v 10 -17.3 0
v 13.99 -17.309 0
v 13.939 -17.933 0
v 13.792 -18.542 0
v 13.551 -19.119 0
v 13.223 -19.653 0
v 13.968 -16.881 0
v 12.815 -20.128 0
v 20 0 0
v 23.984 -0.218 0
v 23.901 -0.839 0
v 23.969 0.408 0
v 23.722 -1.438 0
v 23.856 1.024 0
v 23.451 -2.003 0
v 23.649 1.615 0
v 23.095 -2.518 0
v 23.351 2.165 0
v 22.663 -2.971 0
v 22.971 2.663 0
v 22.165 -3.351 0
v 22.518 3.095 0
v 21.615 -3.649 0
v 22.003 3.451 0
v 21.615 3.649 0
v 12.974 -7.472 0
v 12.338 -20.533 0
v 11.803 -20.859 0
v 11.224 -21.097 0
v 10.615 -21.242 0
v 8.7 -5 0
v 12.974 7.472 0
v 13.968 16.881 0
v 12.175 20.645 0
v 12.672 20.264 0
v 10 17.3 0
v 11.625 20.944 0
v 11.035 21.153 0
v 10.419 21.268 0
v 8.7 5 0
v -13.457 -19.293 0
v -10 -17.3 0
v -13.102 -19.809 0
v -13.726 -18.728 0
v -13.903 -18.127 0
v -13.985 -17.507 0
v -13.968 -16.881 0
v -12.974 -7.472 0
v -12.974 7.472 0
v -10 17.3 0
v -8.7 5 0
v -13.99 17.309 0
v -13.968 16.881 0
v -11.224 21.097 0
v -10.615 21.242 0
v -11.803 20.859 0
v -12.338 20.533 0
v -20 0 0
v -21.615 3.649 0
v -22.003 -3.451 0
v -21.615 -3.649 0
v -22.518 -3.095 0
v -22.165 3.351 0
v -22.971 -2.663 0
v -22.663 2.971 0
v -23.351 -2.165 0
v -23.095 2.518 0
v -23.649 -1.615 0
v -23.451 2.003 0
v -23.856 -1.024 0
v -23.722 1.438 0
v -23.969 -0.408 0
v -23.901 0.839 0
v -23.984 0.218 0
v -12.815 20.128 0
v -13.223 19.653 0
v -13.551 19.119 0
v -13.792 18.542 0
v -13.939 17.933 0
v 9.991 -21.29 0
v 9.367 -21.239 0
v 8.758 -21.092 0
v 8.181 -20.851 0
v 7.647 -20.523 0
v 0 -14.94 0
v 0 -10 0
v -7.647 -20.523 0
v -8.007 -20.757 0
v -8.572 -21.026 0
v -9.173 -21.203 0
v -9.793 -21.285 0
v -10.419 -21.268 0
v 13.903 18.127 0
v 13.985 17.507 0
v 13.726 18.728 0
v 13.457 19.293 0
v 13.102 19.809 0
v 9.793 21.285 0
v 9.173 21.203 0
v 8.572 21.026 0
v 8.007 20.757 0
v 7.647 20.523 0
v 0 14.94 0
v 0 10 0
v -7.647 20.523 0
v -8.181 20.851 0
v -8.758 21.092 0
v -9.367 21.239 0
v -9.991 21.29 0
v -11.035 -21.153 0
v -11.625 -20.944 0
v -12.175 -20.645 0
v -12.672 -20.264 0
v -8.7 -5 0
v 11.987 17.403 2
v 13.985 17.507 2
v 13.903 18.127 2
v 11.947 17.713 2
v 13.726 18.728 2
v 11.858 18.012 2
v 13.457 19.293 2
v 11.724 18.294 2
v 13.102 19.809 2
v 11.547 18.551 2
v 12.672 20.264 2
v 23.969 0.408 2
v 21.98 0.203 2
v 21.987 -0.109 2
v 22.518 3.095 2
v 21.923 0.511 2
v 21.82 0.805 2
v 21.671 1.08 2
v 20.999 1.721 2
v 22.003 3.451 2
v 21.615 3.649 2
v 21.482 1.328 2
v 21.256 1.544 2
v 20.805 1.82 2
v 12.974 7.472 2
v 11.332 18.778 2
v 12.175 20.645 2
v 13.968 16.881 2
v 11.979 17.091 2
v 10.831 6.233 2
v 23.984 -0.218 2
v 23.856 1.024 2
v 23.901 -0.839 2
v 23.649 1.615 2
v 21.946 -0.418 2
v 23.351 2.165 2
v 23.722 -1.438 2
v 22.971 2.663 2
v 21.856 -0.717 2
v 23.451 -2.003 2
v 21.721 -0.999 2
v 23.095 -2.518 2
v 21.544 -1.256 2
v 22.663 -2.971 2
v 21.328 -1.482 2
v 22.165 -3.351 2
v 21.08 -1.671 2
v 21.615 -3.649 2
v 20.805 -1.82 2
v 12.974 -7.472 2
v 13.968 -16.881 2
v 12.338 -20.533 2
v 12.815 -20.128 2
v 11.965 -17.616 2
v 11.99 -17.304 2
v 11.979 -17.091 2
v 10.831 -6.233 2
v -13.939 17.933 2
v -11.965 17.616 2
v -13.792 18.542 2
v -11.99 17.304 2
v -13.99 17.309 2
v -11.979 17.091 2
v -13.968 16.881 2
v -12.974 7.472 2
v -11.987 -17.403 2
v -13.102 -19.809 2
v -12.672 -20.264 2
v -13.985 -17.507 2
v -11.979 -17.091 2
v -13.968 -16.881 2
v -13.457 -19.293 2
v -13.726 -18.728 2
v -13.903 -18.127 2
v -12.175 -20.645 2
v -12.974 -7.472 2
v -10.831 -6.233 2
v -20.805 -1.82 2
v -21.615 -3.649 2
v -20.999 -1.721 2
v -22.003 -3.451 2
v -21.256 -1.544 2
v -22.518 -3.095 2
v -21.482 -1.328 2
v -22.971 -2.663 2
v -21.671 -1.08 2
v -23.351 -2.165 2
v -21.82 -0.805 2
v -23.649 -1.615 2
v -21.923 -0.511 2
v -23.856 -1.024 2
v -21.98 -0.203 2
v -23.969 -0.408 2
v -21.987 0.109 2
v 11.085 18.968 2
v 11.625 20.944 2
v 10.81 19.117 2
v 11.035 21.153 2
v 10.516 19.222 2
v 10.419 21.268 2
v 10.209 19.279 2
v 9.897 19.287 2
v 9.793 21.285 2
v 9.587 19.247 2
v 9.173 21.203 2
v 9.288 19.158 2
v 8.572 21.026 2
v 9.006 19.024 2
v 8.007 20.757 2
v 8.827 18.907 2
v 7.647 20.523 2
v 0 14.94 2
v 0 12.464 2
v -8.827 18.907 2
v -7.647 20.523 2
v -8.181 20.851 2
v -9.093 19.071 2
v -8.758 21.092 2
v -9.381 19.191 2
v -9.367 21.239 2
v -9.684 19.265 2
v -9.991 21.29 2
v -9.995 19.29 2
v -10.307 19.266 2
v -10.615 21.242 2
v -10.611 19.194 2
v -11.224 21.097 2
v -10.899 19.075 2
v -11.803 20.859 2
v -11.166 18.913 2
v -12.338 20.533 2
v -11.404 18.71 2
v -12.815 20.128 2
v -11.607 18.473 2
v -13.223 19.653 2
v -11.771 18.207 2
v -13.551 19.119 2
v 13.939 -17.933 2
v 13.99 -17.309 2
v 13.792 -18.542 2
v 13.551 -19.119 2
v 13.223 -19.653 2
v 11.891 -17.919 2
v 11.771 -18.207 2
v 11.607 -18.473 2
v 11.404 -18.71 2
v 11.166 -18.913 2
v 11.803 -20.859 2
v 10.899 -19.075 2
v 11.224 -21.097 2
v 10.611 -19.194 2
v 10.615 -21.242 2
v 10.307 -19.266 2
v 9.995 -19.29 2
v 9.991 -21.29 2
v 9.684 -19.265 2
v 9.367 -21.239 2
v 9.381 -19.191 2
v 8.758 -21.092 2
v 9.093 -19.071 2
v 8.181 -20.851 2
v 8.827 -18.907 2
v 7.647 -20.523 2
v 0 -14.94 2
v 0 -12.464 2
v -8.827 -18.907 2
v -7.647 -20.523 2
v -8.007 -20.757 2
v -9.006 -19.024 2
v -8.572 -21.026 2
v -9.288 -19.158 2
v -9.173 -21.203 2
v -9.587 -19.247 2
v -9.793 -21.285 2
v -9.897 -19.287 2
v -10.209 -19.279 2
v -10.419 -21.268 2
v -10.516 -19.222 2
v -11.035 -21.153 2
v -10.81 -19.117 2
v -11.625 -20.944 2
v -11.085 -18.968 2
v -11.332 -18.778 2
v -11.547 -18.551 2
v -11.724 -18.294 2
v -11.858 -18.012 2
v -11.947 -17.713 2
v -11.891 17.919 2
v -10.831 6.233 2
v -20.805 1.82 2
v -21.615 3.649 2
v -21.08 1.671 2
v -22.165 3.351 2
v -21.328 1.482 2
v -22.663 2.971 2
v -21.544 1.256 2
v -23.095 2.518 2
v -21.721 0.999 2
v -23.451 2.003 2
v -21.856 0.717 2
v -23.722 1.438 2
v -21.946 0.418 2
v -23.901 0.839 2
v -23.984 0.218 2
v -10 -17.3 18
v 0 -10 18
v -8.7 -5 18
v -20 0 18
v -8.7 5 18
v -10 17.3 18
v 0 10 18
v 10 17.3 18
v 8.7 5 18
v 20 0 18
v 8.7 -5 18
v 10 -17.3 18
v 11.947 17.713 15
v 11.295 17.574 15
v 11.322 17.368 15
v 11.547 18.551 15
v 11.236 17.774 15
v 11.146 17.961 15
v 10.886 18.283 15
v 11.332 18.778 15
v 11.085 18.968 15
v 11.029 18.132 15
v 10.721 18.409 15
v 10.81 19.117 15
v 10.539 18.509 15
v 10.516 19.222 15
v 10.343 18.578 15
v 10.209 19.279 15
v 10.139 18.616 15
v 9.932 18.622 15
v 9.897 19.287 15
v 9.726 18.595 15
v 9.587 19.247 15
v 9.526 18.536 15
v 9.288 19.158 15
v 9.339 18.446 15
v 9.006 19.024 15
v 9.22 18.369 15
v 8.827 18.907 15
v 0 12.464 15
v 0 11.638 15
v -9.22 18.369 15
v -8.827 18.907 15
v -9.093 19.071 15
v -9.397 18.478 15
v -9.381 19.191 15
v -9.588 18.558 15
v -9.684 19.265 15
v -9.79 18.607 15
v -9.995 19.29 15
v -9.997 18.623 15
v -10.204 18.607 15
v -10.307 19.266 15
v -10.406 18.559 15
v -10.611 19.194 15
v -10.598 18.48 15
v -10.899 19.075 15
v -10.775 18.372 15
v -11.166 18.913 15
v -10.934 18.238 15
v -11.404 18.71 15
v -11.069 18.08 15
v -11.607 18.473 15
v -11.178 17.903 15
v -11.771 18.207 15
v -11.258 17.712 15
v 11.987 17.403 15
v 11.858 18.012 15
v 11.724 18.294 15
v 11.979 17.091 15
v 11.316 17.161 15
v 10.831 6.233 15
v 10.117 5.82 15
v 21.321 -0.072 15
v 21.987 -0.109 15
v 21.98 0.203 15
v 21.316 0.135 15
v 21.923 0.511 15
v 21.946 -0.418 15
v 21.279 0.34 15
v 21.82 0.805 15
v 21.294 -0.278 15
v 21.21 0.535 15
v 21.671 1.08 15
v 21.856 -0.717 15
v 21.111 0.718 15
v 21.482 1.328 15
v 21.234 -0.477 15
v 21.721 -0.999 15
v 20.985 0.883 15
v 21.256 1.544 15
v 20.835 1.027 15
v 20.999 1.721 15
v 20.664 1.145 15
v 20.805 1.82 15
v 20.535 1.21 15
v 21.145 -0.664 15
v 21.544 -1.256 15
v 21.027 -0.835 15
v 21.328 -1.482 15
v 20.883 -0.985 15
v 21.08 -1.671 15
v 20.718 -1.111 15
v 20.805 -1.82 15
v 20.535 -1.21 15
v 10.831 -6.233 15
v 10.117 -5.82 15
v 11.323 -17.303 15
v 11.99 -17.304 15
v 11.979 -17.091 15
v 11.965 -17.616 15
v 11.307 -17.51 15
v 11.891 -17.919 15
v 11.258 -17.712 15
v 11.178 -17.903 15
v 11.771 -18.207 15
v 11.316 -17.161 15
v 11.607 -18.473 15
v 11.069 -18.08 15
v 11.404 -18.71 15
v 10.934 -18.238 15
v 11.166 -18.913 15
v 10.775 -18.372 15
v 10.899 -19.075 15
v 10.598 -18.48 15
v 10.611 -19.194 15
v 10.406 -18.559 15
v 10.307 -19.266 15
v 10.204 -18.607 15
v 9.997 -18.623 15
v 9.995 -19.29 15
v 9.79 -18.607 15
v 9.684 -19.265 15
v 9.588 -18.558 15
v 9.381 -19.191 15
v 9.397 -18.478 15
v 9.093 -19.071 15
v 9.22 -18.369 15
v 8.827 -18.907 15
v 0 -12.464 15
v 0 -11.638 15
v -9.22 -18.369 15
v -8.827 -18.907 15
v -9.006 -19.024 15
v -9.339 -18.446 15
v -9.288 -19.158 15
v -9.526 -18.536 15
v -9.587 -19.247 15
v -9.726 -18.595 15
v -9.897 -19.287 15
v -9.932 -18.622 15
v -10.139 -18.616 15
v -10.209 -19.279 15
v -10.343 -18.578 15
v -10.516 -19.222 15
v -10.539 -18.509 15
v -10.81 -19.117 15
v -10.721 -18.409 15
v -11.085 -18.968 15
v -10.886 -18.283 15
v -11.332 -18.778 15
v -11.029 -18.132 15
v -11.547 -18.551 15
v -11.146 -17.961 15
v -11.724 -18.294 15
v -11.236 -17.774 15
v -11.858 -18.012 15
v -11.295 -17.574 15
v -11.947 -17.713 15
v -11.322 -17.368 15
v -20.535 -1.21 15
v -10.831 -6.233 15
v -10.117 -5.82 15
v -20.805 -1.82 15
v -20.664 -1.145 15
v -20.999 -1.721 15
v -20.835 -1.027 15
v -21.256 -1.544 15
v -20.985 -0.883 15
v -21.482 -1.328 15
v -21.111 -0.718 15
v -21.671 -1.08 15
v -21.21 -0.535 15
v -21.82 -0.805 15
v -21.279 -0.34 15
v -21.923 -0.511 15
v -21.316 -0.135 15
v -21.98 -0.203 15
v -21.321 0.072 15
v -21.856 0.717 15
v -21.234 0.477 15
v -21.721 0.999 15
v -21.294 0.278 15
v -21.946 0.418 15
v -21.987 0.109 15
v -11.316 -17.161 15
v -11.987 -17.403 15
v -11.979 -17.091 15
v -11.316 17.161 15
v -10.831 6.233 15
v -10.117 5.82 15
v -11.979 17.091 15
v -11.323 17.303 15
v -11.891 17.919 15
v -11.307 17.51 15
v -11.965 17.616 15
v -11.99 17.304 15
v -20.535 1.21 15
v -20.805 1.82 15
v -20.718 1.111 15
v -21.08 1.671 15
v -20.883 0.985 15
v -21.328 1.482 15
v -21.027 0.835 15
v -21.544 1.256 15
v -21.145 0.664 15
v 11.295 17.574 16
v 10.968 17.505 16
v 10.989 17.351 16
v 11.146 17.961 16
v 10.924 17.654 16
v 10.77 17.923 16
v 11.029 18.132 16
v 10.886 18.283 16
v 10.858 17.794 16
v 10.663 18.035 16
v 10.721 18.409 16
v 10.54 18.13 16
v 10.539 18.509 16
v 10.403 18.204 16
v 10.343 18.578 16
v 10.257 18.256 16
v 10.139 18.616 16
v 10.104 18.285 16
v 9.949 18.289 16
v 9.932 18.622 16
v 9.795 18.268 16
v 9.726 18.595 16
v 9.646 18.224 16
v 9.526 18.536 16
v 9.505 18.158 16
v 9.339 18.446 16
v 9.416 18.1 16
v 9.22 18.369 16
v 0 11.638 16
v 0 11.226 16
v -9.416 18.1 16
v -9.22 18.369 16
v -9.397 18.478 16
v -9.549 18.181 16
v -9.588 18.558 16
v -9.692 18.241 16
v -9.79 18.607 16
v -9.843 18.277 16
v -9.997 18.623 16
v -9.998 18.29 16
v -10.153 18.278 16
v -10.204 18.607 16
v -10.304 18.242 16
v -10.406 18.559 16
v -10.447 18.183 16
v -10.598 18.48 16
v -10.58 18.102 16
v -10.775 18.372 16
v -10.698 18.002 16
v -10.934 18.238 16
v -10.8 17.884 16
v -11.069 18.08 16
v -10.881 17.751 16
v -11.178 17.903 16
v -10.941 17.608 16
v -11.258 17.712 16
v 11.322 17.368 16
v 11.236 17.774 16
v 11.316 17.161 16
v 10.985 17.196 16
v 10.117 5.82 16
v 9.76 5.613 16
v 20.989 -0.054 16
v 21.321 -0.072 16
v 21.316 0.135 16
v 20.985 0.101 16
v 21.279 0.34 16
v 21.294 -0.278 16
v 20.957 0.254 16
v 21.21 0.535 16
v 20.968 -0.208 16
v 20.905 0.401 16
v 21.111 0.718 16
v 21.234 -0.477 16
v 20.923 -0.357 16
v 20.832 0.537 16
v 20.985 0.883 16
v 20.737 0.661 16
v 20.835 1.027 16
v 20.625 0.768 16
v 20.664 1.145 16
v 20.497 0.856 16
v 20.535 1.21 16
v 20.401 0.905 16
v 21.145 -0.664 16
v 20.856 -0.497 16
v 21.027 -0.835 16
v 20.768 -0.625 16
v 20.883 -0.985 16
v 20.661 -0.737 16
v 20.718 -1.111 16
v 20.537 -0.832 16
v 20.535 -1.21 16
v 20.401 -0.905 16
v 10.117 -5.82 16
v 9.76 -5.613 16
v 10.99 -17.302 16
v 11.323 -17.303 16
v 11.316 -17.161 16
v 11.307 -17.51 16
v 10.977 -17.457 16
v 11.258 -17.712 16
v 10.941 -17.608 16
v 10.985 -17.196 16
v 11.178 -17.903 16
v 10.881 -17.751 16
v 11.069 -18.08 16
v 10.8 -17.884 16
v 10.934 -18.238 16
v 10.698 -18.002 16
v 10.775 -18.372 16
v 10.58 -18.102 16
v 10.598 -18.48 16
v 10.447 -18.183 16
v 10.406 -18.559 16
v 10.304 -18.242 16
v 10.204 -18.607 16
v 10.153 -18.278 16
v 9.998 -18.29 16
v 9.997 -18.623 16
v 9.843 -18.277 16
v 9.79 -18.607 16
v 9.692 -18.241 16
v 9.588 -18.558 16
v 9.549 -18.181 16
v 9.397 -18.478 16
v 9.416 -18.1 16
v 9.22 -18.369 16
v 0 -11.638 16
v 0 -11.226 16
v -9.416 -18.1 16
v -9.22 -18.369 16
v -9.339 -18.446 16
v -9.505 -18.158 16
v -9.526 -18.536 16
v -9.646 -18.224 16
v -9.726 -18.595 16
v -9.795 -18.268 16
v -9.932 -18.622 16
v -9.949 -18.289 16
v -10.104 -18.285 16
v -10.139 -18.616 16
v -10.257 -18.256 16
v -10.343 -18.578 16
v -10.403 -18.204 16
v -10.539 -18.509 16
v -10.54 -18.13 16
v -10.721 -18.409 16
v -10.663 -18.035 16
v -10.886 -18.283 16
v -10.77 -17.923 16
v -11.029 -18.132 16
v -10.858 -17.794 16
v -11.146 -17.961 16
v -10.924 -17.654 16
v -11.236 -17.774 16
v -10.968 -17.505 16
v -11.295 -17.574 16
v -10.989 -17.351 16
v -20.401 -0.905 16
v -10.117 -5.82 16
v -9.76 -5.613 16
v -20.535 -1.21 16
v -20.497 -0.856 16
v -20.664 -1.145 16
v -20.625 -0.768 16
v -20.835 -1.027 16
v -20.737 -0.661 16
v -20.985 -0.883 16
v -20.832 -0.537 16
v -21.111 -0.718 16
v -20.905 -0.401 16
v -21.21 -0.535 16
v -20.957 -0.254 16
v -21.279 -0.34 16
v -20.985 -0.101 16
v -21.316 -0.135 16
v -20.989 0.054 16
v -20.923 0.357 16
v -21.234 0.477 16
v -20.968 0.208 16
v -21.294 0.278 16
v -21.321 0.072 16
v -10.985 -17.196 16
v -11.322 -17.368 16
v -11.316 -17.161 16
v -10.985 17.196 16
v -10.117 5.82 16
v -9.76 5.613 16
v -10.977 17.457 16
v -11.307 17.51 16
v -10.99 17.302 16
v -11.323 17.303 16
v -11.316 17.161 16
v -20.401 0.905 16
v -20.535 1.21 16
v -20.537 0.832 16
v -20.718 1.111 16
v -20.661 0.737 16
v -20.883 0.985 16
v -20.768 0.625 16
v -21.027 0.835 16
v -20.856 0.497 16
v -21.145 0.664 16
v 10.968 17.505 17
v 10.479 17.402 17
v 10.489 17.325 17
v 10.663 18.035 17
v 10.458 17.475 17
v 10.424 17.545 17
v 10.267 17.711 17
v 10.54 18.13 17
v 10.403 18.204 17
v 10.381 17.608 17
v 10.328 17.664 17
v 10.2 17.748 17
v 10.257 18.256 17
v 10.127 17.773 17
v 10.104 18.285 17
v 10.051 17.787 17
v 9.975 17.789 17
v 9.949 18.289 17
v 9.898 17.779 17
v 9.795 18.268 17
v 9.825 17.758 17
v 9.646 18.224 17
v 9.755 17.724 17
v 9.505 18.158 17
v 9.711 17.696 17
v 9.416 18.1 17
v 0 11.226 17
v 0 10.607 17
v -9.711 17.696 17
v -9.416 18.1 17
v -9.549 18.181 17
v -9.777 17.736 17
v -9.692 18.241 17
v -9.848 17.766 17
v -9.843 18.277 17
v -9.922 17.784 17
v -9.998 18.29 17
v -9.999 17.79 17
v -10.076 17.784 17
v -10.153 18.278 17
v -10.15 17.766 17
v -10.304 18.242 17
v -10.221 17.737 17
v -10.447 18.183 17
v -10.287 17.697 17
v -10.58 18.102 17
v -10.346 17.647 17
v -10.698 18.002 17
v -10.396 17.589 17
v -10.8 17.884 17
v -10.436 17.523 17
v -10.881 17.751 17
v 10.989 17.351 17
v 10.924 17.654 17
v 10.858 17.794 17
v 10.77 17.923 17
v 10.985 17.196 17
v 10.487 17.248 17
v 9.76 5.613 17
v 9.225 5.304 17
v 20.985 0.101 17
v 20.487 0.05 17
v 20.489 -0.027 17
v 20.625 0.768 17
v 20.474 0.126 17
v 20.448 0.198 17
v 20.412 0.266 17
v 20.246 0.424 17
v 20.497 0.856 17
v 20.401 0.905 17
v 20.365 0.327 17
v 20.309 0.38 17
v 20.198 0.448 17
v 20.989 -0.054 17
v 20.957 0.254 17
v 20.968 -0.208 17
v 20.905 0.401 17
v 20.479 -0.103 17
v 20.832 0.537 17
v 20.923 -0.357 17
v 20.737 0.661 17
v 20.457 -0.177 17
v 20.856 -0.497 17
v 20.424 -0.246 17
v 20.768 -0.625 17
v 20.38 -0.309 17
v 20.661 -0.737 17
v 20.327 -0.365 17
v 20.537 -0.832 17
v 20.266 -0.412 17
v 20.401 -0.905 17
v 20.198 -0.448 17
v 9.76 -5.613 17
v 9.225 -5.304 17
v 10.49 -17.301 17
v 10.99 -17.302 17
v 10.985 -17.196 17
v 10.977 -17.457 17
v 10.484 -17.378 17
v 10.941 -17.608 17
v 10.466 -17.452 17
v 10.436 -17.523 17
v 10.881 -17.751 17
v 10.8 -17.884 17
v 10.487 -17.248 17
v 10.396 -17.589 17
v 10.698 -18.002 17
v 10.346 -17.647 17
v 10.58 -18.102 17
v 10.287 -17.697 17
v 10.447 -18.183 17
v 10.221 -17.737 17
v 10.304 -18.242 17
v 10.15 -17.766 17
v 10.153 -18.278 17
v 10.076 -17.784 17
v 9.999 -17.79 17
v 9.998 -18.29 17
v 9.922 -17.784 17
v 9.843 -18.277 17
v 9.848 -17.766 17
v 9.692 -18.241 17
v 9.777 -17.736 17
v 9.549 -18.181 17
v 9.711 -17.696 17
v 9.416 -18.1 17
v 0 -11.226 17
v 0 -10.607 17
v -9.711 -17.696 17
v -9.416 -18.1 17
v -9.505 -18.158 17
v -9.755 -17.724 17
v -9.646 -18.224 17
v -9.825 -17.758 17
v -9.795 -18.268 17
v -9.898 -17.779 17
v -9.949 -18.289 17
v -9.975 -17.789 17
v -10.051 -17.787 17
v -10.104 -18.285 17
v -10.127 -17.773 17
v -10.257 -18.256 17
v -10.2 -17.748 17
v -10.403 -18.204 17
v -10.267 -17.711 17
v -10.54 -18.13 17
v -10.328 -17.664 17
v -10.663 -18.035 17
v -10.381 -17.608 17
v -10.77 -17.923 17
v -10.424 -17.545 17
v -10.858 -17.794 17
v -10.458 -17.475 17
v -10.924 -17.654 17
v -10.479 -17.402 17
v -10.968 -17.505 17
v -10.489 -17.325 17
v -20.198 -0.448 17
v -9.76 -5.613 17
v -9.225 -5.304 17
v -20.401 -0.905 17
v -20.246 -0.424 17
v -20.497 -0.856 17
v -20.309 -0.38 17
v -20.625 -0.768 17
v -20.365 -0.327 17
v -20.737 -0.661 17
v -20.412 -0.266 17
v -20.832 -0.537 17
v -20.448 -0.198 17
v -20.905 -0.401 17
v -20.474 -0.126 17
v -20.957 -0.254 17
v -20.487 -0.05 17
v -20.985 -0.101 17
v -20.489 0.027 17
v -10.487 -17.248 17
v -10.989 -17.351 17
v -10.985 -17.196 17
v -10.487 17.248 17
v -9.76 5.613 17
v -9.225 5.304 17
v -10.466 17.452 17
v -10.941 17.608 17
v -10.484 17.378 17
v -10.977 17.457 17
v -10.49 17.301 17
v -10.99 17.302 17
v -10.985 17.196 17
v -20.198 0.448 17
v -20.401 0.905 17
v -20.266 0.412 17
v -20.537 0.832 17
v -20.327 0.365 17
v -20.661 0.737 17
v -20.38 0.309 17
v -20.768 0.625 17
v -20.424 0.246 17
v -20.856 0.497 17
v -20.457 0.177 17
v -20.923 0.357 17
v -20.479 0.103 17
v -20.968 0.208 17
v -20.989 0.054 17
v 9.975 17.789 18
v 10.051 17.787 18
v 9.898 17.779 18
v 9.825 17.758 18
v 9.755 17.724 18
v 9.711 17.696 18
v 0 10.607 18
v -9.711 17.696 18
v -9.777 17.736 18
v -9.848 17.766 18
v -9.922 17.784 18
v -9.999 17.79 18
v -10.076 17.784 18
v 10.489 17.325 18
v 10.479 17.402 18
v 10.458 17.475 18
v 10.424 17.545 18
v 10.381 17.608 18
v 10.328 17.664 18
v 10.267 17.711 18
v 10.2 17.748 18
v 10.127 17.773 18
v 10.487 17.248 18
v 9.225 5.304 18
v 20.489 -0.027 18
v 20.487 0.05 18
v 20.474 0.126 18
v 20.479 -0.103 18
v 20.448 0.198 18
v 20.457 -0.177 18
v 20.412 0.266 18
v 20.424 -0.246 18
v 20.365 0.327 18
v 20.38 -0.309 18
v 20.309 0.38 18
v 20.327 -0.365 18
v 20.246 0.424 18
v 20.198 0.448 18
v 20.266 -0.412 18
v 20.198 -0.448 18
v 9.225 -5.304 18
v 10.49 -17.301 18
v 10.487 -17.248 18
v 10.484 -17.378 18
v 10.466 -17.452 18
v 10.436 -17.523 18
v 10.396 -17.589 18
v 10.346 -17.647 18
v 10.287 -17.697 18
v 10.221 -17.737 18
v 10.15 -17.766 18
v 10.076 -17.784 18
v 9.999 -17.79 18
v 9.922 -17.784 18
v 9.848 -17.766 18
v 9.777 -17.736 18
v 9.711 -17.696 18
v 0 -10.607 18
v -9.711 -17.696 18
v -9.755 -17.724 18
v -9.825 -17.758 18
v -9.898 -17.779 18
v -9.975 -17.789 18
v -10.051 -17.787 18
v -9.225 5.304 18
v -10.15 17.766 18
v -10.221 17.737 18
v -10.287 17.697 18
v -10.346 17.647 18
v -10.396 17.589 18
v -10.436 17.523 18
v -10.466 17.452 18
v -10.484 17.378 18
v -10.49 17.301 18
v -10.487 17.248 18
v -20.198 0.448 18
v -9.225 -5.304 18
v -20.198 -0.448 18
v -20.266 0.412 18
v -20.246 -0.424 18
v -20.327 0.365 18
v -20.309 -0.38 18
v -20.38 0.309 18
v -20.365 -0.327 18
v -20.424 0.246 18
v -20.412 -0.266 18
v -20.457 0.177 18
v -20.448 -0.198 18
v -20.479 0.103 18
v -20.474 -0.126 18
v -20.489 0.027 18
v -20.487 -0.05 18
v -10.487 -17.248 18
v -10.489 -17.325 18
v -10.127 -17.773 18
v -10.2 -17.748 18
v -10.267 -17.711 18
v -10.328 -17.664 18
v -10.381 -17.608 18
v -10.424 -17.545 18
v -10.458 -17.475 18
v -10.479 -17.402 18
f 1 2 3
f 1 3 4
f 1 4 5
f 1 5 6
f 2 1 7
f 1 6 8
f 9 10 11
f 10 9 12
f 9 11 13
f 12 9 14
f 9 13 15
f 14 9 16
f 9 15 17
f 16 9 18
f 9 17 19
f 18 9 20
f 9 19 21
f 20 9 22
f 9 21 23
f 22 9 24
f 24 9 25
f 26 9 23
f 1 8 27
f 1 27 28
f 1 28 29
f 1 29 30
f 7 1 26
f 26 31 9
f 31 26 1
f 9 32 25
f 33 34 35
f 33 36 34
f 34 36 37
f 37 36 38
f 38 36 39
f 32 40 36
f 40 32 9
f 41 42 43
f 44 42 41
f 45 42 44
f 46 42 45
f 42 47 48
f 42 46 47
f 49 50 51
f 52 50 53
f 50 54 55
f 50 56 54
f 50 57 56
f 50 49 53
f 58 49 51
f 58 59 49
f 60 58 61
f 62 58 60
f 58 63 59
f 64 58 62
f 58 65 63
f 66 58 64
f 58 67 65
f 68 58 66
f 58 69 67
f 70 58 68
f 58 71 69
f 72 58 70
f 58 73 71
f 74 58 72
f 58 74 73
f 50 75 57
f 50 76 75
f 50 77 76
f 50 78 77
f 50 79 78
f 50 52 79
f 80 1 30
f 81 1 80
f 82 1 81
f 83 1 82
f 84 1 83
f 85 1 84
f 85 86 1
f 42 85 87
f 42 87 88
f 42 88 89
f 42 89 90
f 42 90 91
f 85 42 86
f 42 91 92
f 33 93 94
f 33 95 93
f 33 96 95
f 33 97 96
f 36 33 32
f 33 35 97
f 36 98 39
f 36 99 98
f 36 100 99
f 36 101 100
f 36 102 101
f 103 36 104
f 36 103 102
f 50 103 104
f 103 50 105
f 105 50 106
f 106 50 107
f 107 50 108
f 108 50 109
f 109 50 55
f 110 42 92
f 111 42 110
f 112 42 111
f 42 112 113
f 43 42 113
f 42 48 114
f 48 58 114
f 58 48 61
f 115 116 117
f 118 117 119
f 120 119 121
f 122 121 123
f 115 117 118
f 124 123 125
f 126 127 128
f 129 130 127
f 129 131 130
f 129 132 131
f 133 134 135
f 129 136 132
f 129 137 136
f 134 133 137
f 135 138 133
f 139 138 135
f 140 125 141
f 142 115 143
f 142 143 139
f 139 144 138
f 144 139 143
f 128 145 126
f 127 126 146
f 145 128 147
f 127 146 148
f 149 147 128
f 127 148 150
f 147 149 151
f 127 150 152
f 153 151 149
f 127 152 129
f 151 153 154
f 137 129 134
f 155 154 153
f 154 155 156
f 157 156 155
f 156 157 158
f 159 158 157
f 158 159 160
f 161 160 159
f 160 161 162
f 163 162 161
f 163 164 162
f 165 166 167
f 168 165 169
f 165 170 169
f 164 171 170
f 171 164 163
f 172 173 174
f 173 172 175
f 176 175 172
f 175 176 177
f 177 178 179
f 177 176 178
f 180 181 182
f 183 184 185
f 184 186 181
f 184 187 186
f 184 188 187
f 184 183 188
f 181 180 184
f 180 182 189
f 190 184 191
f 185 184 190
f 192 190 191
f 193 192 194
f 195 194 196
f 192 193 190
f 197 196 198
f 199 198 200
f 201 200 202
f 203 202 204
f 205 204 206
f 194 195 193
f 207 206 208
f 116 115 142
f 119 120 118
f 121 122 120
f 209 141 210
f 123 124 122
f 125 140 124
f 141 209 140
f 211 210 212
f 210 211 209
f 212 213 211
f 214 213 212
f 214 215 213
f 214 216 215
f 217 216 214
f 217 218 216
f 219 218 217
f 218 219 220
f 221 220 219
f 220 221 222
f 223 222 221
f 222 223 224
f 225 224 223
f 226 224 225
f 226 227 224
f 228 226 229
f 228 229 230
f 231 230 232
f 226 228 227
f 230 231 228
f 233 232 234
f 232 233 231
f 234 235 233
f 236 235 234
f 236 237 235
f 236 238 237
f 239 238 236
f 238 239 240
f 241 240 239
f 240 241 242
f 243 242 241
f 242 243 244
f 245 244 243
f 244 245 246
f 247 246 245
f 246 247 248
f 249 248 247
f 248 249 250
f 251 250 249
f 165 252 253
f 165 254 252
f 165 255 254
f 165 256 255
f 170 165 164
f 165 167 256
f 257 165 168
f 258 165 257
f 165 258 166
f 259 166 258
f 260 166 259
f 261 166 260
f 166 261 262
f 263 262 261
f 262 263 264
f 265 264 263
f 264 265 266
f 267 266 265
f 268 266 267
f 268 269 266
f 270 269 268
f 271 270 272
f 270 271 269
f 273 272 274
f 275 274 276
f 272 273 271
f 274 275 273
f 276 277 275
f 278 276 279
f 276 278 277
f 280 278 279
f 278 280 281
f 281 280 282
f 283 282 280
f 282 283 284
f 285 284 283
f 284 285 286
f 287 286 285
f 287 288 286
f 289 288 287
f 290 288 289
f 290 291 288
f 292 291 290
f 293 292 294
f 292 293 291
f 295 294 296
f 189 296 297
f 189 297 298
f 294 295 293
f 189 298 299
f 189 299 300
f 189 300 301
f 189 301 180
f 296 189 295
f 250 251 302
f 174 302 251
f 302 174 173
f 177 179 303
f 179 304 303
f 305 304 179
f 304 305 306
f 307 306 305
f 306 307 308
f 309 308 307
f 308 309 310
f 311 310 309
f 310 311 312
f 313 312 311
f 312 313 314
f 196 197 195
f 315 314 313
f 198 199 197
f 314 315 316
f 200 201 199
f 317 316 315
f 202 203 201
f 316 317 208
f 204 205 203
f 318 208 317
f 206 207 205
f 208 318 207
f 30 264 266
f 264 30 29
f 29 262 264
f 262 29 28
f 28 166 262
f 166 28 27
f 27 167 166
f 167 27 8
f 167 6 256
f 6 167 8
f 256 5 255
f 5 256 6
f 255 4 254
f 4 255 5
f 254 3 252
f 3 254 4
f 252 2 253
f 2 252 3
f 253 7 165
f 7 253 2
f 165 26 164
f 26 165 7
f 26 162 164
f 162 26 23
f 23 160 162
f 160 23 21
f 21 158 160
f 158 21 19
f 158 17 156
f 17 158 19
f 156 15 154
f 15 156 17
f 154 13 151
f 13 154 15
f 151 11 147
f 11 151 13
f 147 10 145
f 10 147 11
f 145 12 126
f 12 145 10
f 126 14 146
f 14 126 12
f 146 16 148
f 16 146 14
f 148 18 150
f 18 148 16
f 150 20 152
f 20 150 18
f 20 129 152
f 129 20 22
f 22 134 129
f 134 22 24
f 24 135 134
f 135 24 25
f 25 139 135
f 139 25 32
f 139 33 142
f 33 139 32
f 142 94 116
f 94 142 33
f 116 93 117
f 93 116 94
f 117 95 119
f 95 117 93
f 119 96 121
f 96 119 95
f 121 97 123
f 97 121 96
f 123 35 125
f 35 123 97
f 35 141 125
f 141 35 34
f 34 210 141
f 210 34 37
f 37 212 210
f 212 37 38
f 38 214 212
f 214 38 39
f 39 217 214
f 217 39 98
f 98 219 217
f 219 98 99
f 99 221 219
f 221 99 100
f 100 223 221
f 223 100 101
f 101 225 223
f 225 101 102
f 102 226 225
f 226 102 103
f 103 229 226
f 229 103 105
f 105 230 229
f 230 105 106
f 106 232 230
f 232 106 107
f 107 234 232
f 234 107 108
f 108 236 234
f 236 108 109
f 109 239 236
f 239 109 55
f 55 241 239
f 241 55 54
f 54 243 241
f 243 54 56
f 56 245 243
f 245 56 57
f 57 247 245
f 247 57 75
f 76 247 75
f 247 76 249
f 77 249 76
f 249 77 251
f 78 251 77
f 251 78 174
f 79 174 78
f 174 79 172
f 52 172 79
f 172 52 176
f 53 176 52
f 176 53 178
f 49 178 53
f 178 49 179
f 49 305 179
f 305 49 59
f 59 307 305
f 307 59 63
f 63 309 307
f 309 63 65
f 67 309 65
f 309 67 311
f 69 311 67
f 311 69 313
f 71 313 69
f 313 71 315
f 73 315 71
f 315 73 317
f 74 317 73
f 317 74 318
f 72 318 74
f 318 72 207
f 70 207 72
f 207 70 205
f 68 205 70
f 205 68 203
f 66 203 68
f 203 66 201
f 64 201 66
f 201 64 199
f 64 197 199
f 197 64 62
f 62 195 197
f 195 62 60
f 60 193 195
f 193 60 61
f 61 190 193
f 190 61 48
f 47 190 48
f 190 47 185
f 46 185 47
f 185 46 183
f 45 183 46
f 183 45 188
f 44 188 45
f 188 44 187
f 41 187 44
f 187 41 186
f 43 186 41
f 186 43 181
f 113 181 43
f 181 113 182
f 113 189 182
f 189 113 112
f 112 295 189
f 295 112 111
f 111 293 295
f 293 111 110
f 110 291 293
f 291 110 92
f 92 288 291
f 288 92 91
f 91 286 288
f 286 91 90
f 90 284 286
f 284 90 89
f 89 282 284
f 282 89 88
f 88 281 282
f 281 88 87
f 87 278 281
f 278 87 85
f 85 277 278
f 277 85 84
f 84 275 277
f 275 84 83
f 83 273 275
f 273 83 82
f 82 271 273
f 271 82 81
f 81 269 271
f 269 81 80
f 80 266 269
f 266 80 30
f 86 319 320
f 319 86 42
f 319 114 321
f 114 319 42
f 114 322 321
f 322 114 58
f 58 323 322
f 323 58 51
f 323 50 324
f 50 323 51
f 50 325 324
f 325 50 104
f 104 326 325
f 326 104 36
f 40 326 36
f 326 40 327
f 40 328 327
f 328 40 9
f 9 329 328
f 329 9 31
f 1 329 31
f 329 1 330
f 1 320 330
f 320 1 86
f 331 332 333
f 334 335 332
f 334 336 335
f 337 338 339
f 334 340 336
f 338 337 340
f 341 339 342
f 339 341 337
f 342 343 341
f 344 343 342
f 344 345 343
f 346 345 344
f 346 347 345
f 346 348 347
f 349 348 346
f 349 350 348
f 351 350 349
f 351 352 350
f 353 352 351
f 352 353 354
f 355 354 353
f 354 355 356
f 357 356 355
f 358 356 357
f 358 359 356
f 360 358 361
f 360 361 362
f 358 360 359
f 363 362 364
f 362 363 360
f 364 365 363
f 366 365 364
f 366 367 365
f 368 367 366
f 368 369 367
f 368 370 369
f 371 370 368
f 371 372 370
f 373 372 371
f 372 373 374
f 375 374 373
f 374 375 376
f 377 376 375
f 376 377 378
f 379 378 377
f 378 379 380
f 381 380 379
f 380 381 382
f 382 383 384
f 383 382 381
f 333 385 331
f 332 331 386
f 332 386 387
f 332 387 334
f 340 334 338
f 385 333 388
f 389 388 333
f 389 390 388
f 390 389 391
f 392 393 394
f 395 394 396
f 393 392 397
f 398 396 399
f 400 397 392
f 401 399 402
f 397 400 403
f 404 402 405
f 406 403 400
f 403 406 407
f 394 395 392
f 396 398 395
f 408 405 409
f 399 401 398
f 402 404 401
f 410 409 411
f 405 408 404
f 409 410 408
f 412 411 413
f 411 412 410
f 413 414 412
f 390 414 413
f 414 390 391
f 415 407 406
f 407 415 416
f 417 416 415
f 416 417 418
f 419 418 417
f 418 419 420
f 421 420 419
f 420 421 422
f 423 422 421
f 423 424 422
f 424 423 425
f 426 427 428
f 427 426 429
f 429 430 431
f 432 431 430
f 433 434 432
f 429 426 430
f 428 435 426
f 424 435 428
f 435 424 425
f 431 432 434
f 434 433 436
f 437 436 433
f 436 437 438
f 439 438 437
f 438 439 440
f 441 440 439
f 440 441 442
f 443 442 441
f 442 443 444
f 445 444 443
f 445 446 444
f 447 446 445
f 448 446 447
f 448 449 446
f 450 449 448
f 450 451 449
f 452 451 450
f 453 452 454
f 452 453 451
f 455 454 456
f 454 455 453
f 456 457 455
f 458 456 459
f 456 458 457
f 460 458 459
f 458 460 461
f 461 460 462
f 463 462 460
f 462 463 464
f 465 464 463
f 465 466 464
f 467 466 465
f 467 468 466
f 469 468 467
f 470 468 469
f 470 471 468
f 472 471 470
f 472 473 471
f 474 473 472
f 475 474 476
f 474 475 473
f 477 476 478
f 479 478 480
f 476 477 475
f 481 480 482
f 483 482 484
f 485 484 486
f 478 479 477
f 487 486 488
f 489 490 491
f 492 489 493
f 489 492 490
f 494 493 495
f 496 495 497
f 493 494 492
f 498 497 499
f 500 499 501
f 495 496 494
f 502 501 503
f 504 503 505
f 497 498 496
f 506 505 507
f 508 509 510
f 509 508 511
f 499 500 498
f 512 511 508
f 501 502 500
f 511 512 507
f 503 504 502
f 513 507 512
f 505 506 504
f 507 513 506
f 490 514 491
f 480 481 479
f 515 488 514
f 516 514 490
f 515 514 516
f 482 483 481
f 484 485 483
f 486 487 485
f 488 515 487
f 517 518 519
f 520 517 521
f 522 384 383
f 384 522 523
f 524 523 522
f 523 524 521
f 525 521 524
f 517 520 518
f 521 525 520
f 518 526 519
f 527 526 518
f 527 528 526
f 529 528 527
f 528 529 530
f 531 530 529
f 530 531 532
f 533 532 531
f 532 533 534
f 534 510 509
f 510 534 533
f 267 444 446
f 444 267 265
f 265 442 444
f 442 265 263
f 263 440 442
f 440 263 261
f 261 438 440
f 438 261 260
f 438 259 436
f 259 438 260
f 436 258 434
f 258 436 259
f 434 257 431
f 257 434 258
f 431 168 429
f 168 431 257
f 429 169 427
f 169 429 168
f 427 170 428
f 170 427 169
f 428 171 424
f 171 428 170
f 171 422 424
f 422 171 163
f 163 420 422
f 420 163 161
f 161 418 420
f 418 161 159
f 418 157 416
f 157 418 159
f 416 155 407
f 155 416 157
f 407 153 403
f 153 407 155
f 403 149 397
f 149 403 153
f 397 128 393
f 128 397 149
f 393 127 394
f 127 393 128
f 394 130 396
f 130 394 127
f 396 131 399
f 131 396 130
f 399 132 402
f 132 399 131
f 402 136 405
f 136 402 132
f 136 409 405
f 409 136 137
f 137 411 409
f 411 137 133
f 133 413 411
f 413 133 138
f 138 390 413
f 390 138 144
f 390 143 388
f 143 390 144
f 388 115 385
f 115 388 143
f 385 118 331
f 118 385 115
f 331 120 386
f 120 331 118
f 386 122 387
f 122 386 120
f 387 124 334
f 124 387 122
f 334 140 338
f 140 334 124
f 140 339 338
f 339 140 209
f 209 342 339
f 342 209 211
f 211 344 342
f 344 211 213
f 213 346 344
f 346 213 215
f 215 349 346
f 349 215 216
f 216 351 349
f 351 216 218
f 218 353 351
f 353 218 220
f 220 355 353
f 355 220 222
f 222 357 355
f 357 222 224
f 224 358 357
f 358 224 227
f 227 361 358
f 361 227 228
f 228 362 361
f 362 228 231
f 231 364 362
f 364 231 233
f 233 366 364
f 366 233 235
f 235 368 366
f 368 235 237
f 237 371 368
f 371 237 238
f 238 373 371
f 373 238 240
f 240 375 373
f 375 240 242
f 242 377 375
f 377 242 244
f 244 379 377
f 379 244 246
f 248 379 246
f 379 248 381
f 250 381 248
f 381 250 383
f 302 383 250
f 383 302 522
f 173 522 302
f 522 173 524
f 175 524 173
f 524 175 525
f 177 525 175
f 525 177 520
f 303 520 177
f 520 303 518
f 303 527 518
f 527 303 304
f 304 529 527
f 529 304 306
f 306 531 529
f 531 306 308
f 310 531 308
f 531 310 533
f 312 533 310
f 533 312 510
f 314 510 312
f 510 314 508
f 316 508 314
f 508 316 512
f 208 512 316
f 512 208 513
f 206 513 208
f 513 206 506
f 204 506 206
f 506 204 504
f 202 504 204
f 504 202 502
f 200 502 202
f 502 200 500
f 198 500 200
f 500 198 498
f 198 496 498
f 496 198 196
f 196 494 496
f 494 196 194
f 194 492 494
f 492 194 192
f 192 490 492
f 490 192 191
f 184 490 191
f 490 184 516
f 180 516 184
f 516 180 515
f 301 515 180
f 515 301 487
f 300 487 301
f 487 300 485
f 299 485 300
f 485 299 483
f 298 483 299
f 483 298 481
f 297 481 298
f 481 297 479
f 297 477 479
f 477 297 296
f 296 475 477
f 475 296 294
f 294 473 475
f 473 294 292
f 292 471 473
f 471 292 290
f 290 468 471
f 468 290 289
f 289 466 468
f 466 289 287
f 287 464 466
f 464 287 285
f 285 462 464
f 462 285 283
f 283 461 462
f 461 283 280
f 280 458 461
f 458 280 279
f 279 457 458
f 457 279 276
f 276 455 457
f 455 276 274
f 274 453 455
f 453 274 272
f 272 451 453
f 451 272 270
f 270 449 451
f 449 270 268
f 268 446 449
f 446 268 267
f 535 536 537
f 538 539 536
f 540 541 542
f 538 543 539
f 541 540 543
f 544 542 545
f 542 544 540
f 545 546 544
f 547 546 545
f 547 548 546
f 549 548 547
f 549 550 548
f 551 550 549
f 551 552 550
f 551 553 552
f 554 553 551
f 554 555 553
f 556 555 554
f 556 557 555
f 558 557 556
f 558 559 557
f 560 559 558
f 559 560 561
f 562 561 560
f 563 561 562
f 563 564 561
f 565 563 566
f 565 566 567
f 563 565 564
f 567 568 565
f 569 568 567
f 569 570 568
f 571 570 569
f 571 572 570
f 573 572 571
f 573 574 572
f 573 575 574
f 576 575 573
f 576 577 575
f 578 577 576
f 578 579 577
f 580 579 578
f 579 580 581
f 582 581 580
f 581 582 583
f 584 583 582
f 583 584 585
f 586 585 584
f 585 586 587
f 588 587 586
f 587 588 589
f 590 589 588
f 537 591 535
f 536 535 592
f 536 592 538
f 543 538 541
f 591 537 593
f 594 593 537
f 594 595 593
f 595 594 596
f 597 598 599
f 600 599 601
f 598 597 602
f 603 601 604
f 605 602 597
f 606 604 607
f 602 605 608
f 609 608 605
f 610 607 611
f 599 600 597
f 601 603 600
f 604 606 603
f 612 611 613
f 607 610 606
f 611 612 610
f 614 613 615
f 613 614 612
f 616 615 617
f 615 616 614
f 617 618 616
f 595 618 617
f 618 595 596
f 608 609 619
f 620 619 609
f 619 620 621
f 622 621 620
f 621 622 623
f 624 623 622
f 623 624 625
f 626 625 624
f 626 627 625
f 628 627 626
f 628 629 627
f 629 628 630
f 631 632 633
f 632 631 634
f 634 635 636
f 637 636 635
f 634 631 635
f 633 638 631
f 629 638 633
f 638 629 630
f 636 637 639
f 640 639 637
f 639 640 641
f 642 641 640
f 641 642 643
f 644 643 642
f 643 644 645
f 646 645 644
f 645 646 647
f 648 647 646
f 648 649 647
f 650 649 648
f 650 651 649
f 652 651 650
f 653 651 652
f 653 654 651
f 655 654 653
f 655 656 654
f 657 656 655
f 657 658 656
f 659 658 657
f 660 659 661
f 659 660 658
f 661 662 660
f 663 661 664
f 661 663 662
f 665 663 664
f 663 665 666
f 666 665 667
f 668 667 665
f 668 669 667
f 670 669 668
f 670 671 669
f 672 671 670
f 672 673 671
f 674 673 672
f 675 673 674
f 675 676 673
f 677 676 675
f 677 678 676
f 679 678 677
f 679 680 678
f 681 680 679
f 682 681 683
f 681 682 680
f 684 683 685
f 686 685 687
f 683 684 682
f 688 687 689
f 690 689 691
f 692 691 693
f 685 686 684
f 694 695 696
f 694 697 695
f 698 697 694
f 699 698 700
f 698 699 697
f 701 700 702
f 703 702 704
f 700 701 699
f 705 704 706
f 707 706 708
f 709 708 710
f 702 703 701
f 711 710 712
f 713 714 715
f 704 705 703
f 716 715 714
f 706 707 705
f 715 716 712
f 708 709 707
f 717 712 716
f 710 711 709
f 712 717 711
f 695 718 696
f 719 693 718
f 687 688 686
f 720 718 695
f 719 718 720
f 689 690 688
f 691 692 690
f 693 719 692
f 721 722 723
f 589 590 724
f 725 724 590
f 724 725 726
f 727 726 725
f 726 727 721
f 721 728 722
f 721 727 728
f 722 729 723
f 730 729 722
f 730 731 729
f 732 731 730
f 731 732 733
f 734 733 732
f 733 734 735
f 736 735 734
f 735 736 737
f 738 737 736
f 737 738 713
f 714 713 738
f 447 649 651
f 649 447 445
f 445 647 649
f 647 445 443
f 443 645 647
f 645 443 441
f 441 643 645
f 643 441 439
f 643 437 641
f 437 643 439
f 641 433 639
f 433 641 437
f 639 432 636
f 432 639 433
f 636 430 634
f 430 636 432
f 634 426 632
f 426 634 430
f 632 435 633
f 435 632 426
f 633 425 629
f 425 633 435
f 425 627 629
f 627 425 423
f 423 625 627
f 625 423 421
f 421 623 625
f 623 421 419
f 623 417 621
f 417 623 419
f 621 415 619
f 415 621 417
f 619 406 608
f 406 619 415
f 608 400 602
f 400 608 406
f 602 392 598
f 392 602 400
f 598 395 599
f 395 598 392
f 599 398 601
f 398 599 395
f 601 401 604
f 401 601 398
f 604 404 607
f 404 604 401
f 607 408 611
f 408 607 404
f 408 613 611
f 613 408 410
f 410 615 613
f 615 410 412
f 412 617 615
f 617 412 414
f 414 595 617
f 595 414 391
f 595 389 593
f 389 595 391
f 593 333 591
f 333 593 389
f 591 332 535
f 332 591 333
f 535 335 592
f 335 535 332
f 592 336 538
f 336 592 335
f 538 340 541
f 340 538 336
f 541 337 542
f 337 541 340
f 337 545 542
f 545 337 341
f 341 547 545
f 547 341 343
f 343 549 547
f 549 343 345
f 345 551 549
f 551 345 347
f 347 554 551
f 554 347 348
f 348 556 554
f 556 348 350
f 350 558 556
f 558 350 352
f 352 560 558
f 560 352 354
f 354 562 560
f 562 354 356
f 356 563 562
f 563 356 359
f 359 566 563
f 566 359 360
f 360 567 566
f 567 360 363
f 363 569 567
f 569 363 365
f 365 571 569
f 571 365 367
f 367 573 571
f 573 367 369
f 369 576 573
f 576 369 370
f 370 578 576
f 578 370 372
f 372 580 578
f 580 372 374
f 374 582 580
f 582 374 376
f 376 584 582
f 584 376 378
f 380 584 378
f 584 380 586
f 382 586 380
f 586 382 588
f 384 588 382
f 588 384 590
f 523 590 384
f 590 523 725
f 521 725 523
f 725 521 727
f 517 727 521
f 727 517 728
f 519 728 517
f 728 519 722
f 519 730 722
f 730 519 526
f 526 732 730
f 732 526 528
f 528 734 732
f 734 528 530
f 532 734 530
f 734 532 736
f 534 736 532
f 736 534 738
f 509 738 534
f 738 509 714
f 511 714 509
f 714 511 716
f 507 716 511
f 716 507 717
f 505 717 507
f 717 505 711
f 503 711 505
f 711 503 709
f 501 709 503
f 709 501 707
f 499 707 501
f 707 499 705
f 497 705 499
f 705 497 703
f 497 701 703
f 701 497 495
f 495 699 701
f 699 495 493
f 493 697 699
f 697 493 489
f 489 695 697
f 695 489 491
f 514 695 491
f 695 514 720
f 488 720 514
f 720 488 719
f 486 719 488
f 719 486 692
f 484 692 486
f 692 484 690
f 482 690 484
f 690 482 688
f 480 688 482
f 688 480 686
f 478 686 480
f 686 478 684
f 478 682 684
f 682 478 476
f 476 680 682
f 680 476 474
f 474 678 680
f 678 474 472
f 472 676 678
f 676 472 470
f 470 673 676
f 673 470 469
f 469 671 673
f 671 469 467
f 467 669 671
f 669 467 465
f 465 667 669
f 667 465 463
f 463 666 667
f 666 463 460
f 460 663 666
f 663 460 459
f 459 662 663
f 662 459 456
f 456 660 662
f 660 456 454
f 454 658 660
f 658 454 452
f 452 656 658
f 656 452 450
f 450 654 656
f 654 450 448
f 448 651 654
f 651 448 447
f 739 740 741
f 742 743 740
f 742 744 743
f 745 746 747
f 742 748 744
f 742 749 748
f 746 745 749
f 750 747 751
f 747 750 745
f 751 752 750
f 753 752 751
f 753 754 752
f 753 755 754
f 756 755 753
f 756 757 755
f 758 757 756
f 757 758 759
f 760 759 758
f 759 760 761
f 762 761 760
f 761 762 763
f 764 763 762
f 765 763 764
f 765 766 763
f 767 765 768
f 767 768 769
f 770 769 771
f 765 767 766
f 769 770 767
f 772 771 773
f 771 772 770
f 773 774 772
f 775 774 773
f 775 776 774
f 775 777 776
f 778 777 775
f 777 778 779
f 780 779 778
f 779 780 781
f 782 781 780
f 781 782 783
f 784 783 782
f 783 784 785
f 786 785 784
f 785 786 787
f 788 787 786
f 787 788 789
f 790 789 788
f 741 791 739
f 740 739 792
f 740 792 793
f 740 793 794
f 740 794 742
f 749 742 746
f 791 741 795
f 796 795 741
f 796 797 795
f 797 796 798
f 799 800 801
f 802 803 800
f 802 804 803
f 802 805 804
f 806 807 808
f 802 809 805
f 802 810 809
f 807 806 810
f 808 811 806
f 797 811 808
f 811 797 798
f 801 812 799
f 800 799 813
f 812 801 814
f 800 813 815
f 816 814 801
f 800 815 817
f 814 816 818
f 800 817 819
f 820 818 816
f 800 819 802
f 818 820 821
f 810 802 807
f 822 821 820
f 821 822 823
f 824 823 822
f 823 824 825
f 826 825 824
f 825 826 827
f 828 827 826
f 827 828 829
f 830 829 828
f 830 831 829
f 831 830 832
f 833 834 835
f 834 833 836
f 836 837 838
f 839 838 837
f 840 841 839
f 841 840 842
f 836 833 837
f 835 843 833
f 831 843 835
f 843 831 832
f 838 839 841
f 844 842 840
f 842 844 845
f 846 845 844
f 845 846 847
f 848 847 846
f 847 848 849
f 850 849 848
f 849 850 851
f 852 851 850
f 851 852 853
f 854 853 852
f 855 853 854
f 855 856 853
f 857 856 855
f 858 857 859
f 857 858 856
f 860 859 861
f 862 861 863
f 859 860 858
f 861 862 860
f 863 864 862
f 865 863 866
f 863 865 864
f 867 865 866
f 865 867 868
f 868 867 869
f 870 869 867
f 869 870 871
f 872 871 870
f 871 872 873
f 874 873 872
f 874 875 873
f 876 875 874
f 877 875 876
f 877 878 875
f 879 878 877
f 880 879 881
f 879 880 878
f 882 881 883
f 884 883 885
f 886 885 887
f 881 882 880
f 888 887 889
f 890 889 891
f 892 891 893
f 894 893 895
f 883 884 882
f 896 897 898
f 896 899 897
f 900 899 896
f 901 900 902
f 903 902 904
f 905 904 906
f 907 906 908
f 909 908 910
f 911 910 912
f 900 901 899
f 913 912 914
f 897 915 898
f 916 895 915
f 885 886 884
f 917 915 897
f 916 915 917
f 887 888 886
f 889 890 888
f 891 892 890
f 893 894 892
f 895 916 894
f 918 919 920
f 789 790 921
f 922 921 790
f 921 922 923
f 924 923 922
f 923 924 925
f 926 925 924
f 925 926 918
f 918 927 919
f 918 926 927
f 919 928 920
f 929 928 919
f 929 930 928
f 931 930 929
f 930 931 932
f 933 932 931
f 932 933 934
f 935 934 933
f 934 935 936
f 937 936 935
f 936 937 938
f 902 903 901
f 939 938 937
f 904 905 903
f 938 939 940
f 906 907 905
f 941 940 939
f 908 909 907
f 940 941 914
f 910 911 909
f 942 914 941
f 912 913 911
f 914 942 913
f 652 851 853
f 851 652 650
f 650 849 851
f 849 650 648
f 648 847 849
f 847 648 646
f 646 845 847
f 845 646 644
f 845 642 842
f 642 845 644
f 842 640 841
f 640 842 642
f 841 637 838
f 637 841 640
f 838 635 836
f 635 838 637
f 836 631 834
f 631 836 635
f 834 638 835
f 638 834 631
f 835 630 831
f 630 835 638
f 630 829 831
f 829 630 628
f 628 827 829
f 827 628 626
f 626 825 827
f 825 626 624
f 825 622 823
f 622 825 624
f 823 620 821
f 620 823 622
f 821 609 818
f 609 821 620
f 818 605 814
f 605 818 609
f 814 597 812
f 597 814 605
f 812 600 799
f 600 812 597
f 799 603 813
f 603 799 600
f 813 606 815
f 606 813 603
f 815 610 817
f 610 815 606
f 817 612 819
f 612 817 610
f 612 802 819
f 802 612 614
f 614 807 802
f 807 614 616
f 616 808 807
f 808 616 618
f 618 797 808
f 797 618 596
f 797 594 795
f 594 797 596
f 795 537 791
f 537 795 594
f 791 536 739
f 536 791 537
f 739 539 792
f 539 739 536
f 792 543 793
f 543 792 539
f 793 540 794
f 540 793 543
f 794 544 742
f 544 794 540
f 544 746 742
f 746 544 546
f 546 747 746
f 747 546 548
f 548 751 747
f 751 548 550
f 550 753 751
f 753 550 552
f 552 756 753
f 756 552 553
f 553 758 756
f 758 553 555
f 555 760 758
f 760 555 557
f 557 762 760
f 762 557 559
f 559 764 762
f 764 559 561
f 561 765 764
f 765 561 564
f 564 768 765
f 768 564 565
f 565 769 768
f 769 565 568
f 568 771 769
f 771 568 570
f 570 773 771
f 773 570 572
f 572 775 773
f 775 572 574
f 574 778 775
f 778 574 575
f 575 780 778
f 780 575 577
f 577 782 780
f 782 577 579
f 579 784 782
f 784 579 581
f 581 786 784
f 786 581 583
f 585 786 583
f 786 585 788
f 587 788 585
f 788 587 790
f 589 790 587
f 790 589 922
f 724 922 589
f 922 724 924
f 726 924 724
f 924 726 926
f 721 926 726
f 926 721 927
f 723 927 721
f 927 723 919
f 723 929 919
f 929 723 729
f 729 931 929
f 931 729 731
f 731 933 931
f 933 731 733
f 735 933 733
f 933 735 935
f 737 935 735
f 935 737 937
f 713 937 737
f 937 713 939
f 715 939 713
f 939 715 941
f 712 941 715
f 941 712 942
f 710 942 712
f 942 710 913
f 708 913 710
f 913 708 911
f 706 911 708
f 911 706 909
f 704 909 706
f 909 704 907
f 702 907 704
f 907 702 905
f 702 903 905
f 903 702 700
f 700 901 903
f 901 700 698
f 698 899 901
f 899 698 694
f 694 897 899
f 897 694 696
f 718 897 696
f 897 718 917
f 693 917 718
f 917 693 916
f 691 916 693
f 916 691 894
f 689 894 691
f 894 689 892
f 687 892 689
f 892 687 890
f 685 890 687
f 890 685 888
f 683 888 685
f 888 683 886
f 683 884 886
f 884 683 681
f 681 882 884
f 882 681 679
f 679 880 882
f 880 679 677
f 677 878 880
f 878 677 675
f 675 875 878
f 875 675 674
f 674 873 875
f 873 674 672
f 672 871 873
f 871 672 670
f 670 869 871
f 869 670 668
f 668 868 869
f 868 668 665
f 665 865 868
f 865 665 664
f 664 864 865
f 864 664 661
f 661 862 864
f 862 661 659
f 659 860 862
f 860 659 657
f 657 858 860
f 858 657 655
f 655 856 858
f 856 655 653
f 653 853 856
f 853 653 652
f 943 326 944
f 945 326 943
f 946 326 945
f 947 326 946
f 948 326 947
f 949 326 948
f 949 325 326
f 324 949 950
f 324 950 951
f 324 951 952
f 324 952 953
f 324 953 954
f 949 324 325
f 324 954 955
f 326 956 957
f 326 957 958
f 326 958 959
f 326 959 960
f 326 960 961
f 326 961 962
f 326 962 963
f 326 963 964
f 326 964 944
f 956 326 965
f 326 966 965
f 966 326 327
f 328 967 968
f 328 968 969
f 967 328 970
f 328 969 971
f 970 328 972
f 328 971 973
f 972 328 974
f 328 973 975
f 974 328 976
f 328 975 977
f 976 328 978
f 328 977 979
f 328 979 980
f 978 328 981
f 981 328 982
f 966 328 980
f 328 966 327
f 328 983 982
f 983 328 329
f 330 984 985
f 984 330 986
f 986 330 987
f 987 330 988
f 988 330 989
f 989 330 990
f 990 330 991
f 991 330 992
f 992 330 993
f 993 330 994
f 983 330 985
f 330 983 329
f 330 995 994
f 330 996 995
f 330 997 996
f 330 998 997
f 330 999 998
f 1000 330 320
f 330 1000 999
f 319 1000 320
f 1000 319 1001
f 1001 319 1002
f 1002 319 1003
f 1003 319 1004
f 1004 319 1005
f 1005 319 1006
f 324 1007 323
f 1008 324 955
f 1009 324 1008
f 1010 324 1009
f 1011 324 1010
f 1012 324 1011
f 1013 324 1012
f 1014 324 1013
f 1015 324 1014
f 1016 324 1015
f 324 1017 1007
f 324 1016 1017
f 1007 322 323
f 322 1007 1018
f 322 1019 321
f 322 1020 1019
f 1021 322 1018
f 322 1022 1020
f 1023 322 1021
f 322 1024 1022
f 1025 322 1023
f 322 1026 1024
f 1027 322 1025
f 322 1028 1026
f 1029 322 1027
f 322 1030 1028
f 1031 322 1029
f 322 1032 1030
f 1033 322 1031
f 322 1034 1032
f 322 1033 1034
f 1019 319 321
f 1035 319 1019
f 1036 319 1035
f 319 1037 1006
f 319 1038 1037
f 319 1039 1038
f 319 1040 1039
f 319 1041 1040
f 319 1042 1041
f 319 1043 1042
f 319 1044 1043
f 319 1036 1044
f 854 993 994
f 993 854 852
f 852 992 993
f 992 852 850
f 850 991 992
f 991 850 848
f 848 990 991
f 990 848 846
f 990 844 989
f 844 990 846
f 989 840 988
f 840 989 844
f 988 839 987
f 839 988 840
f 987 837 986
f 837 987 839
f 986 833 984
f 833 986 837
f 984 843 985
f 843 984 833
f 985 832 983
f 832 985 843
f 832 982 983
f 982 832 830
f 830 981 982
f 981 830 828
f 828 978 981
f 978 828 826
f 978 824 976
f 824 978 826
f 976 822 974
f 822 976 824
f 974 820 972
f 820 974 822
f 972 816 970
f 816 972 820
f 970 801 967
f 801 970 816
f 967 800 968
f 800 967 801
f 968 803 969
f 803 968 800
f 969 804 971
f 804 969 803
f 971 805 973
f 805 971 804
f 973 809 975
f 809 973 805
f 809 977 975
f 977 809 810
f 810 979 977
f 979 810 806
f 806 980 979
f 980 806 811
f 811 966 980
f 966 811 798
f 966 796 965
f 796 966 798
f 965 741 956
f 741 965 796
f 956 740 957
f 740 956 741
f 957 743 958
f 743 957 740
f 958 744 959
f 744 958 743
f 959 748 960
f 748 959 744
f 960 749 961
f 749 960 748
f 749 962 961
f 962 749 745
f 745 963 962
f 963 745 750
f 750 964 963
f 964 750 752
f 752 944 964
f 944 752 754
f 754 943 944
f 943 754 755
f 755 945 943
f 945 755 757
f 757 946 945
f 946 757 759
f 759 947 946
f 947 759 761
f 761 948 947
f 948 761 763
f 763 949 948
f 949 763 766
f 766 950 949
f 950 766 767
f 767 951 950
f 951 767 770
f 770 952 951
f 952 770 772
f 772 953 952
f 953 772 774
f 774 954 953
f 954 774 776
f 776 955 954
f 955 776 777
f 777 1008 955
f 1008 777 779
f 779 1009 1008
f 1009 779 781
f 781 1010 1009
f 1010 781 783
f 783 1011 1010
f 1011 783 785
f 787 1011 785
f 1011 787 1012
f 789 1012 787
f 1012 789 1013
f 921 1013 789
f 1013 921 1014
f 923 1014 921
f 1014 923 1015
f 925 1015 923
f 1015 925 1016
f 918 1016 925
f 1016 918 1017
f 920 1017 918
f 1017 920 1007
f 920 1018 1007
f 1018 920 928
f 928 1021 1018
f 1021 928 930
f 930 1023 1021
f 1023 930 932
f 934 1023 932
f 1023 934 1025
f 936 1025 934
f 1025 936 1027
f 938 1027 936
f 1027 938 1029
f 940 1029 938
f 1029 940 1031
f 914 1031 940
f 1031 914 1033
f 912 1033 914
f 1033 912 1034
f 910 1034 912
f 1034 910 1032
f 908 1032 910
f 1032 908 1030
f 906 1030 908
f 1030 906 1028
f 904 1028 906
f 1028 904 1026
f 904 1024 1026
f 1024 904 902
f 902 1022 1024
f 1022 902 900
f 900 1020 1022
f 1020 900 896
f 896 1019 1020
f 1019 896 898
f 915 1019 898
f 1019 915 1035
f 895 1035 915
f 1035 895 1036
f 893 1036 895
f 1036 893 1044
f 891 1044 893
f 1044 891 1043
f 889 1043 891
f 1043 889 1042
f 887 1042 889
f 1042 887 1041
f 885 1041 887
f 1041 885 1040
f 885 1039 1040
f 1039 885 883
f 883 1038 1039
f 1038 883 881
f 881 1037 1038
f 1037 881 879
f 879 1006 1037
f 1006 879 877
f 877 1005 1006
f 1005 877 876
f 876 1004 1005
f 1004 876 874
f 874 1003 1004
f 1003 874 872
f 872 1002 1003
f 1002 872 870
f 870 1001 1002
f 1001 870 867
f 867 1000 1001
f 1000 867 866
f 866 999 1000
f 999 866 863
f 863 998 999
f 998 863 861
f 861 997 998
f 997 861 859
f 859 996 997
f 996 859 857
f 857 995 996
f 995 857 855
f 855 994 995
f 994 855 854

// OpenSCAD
wall   =  2; // [1:0.05:3]
rim    =  4; // [2:0.05:6]
height = 15; // [10:1:15]
index  =  0; // [0,1,2,3,4,5]
spikes =  6; // [5,6]

$fn=40;

// path
star_5=[
// size 10 / 20
[[ 0.0,10.0],	[11.8,16.2],
[ 9.5, 3.1],	[19.0,- 6.2],
[ 5.9,- 8.1],	[ 0.0,-20.0],
[- 5.9,- 8.1],	[-19.0,- 6.2],
[- 9.5, 3.1],	[-11.8,16.2]
],
// size 15 / 30
[[ 0.0,15.0],	[17.6,24.3],
[14.3, 4.6],	[28.5,- 9.3],
[ 8.8,-12.1],	[ 0.0,-30.0],
[- 8.8,-12.1],	[-28.5,- 9.3],
[-14.3, 4.6],	[-17.6,24.3],
],
// size 20 / 40
[[ 0.0,20.0],	[23.5,32.4],
[19.0, 6.2],	[38.0,-12.4],
[11.8,-16.2],	[ 0.0,-40.0],
[-11.8,-16.2],	[-38.0,-12.4],
[-19.0, 6.2],	[-23.5,32.4],
],
// size 25 / 50
[[ 0.0,25.0],	[29.4,40.5],
[23.8, 7.7],	[47.6,-15.5],
[14.7,-20.2],	[ 0.0,-50.0],
[-14.7,-20.2],	[-47.6,-15.5],
[-23.8, 7.7],	[-29.4,40.5],
],
// size 30/ 60
[[ 0.0,30.0],	[35.3,48.5],
[28.5, 9.3],	[57.1,-18.5],
[17.6,-24.3],	[ 0.0,-60.0],
[-17.6,-24.3],	[-57.1,-18.5],
[-28.5, 9.3],	[-35.3,48.5],
]];

star_6=[
// size 10 / 20
[[ 0.0,10.0],	[10.0,17.3],
[ 8.7, 5.0],	[20.0, 0.0],
[ 8.7,- 5.0],	[10.0,-17.3],
[ 0.0,-10.0],	[-10.0,-17.3],
[- 8.7,- 5.0],	[-20.0, 0.0],
[- 8.7, 5.0],	[-10.0,17.3]
],
// size 15 / 30
[[ 0.0,15.0],	[15.0,26.0],
[13.0, 7.5],	[30.0, 0.0],
[13.0,- 7.5],	[15.0,-26.0],
[ 0.0,-15.0],	[-15.0,-26.0],
[-13.0,- 7.5],	[-30.0, 0.0],
[-13.0, 7.5],	[-15.0,26.0]
],
// size 20 / 40
[[ 0.0,20.0],	[20.0,34.6],
[17.3,10.0],	[40.0, 0.0],
[17.3,-10.0],	[20.0,-34.6],
[ 0.0,-20.0],	[-20.0,-34.6],
[-17.3,-10.0],	[-40.0, 0.0],
[-17.3,10.0],	[-20.0,34.6]
],
// size 25 / 50
[[ 0.0,25.0],	[25.0,43.3],
[21.7,12.5],	[50.0, 0.0],
[21.7,-12.5],	[25.0,-43.3],
[ 0.0,-25.0],	[-25.0,-43.3],
[-21.7,-12.5],	[-50.0, 0.0],
[-21.7,12.5],	[-25.0,43.3]
],
// size 30/ 60
[[ 0.0,30.0],	[30.0,52.0],
[26.0,15.0],	[60.0, 0.0],
[26.0,-15.0],	[30.0,-52.0],
[ 0.0,-30.0],	[-30.0,-52.0],
[-26.0,-15.0],	[-60.0, 0.0],
[-26.0,15.0],	[-30.0,52.0]
]];

all();

module all()
{
    /*
    cake(star_5[0],height);
    cake(star_5[1],height);
    cake(star_5[2],height);
    cake(star_5[3],height);
    cake(star_5[4],height);
    */
    /*
    cake(star_6[0],height);
    cake(star_6[1],height);
    cake(star_6[2],height);
    cake(star_6[3],height);
    cake(star_6[4],height);
    */
    if(spikes == 5)
    {
        cake(star_5[index],height);
    }
    if(spikes == 6)
    {
        cake(star_6[index],height);
    }
}

module layer(poly, h, b)
{
    linear_extrude(h)
        difference()
        {
            offset(r=b)   polygon(poly);
            /*offset(r=0-b)*/ polygon(poly);
        }
}

 

module cake(path, height)
{
    // correction fix to avoid needles infill and movements
    fix = 0.01;
    
    // Basis
    layer(path,wall,rim-fix);

    // wall
    layer(path,height,wall-fix);

    // cutter
    layer(path,height+1,wall*2/3-fix);
    layer(path,height+2,wall/2-fix);
    layer(path,height+3,wall/4-fix);

}

